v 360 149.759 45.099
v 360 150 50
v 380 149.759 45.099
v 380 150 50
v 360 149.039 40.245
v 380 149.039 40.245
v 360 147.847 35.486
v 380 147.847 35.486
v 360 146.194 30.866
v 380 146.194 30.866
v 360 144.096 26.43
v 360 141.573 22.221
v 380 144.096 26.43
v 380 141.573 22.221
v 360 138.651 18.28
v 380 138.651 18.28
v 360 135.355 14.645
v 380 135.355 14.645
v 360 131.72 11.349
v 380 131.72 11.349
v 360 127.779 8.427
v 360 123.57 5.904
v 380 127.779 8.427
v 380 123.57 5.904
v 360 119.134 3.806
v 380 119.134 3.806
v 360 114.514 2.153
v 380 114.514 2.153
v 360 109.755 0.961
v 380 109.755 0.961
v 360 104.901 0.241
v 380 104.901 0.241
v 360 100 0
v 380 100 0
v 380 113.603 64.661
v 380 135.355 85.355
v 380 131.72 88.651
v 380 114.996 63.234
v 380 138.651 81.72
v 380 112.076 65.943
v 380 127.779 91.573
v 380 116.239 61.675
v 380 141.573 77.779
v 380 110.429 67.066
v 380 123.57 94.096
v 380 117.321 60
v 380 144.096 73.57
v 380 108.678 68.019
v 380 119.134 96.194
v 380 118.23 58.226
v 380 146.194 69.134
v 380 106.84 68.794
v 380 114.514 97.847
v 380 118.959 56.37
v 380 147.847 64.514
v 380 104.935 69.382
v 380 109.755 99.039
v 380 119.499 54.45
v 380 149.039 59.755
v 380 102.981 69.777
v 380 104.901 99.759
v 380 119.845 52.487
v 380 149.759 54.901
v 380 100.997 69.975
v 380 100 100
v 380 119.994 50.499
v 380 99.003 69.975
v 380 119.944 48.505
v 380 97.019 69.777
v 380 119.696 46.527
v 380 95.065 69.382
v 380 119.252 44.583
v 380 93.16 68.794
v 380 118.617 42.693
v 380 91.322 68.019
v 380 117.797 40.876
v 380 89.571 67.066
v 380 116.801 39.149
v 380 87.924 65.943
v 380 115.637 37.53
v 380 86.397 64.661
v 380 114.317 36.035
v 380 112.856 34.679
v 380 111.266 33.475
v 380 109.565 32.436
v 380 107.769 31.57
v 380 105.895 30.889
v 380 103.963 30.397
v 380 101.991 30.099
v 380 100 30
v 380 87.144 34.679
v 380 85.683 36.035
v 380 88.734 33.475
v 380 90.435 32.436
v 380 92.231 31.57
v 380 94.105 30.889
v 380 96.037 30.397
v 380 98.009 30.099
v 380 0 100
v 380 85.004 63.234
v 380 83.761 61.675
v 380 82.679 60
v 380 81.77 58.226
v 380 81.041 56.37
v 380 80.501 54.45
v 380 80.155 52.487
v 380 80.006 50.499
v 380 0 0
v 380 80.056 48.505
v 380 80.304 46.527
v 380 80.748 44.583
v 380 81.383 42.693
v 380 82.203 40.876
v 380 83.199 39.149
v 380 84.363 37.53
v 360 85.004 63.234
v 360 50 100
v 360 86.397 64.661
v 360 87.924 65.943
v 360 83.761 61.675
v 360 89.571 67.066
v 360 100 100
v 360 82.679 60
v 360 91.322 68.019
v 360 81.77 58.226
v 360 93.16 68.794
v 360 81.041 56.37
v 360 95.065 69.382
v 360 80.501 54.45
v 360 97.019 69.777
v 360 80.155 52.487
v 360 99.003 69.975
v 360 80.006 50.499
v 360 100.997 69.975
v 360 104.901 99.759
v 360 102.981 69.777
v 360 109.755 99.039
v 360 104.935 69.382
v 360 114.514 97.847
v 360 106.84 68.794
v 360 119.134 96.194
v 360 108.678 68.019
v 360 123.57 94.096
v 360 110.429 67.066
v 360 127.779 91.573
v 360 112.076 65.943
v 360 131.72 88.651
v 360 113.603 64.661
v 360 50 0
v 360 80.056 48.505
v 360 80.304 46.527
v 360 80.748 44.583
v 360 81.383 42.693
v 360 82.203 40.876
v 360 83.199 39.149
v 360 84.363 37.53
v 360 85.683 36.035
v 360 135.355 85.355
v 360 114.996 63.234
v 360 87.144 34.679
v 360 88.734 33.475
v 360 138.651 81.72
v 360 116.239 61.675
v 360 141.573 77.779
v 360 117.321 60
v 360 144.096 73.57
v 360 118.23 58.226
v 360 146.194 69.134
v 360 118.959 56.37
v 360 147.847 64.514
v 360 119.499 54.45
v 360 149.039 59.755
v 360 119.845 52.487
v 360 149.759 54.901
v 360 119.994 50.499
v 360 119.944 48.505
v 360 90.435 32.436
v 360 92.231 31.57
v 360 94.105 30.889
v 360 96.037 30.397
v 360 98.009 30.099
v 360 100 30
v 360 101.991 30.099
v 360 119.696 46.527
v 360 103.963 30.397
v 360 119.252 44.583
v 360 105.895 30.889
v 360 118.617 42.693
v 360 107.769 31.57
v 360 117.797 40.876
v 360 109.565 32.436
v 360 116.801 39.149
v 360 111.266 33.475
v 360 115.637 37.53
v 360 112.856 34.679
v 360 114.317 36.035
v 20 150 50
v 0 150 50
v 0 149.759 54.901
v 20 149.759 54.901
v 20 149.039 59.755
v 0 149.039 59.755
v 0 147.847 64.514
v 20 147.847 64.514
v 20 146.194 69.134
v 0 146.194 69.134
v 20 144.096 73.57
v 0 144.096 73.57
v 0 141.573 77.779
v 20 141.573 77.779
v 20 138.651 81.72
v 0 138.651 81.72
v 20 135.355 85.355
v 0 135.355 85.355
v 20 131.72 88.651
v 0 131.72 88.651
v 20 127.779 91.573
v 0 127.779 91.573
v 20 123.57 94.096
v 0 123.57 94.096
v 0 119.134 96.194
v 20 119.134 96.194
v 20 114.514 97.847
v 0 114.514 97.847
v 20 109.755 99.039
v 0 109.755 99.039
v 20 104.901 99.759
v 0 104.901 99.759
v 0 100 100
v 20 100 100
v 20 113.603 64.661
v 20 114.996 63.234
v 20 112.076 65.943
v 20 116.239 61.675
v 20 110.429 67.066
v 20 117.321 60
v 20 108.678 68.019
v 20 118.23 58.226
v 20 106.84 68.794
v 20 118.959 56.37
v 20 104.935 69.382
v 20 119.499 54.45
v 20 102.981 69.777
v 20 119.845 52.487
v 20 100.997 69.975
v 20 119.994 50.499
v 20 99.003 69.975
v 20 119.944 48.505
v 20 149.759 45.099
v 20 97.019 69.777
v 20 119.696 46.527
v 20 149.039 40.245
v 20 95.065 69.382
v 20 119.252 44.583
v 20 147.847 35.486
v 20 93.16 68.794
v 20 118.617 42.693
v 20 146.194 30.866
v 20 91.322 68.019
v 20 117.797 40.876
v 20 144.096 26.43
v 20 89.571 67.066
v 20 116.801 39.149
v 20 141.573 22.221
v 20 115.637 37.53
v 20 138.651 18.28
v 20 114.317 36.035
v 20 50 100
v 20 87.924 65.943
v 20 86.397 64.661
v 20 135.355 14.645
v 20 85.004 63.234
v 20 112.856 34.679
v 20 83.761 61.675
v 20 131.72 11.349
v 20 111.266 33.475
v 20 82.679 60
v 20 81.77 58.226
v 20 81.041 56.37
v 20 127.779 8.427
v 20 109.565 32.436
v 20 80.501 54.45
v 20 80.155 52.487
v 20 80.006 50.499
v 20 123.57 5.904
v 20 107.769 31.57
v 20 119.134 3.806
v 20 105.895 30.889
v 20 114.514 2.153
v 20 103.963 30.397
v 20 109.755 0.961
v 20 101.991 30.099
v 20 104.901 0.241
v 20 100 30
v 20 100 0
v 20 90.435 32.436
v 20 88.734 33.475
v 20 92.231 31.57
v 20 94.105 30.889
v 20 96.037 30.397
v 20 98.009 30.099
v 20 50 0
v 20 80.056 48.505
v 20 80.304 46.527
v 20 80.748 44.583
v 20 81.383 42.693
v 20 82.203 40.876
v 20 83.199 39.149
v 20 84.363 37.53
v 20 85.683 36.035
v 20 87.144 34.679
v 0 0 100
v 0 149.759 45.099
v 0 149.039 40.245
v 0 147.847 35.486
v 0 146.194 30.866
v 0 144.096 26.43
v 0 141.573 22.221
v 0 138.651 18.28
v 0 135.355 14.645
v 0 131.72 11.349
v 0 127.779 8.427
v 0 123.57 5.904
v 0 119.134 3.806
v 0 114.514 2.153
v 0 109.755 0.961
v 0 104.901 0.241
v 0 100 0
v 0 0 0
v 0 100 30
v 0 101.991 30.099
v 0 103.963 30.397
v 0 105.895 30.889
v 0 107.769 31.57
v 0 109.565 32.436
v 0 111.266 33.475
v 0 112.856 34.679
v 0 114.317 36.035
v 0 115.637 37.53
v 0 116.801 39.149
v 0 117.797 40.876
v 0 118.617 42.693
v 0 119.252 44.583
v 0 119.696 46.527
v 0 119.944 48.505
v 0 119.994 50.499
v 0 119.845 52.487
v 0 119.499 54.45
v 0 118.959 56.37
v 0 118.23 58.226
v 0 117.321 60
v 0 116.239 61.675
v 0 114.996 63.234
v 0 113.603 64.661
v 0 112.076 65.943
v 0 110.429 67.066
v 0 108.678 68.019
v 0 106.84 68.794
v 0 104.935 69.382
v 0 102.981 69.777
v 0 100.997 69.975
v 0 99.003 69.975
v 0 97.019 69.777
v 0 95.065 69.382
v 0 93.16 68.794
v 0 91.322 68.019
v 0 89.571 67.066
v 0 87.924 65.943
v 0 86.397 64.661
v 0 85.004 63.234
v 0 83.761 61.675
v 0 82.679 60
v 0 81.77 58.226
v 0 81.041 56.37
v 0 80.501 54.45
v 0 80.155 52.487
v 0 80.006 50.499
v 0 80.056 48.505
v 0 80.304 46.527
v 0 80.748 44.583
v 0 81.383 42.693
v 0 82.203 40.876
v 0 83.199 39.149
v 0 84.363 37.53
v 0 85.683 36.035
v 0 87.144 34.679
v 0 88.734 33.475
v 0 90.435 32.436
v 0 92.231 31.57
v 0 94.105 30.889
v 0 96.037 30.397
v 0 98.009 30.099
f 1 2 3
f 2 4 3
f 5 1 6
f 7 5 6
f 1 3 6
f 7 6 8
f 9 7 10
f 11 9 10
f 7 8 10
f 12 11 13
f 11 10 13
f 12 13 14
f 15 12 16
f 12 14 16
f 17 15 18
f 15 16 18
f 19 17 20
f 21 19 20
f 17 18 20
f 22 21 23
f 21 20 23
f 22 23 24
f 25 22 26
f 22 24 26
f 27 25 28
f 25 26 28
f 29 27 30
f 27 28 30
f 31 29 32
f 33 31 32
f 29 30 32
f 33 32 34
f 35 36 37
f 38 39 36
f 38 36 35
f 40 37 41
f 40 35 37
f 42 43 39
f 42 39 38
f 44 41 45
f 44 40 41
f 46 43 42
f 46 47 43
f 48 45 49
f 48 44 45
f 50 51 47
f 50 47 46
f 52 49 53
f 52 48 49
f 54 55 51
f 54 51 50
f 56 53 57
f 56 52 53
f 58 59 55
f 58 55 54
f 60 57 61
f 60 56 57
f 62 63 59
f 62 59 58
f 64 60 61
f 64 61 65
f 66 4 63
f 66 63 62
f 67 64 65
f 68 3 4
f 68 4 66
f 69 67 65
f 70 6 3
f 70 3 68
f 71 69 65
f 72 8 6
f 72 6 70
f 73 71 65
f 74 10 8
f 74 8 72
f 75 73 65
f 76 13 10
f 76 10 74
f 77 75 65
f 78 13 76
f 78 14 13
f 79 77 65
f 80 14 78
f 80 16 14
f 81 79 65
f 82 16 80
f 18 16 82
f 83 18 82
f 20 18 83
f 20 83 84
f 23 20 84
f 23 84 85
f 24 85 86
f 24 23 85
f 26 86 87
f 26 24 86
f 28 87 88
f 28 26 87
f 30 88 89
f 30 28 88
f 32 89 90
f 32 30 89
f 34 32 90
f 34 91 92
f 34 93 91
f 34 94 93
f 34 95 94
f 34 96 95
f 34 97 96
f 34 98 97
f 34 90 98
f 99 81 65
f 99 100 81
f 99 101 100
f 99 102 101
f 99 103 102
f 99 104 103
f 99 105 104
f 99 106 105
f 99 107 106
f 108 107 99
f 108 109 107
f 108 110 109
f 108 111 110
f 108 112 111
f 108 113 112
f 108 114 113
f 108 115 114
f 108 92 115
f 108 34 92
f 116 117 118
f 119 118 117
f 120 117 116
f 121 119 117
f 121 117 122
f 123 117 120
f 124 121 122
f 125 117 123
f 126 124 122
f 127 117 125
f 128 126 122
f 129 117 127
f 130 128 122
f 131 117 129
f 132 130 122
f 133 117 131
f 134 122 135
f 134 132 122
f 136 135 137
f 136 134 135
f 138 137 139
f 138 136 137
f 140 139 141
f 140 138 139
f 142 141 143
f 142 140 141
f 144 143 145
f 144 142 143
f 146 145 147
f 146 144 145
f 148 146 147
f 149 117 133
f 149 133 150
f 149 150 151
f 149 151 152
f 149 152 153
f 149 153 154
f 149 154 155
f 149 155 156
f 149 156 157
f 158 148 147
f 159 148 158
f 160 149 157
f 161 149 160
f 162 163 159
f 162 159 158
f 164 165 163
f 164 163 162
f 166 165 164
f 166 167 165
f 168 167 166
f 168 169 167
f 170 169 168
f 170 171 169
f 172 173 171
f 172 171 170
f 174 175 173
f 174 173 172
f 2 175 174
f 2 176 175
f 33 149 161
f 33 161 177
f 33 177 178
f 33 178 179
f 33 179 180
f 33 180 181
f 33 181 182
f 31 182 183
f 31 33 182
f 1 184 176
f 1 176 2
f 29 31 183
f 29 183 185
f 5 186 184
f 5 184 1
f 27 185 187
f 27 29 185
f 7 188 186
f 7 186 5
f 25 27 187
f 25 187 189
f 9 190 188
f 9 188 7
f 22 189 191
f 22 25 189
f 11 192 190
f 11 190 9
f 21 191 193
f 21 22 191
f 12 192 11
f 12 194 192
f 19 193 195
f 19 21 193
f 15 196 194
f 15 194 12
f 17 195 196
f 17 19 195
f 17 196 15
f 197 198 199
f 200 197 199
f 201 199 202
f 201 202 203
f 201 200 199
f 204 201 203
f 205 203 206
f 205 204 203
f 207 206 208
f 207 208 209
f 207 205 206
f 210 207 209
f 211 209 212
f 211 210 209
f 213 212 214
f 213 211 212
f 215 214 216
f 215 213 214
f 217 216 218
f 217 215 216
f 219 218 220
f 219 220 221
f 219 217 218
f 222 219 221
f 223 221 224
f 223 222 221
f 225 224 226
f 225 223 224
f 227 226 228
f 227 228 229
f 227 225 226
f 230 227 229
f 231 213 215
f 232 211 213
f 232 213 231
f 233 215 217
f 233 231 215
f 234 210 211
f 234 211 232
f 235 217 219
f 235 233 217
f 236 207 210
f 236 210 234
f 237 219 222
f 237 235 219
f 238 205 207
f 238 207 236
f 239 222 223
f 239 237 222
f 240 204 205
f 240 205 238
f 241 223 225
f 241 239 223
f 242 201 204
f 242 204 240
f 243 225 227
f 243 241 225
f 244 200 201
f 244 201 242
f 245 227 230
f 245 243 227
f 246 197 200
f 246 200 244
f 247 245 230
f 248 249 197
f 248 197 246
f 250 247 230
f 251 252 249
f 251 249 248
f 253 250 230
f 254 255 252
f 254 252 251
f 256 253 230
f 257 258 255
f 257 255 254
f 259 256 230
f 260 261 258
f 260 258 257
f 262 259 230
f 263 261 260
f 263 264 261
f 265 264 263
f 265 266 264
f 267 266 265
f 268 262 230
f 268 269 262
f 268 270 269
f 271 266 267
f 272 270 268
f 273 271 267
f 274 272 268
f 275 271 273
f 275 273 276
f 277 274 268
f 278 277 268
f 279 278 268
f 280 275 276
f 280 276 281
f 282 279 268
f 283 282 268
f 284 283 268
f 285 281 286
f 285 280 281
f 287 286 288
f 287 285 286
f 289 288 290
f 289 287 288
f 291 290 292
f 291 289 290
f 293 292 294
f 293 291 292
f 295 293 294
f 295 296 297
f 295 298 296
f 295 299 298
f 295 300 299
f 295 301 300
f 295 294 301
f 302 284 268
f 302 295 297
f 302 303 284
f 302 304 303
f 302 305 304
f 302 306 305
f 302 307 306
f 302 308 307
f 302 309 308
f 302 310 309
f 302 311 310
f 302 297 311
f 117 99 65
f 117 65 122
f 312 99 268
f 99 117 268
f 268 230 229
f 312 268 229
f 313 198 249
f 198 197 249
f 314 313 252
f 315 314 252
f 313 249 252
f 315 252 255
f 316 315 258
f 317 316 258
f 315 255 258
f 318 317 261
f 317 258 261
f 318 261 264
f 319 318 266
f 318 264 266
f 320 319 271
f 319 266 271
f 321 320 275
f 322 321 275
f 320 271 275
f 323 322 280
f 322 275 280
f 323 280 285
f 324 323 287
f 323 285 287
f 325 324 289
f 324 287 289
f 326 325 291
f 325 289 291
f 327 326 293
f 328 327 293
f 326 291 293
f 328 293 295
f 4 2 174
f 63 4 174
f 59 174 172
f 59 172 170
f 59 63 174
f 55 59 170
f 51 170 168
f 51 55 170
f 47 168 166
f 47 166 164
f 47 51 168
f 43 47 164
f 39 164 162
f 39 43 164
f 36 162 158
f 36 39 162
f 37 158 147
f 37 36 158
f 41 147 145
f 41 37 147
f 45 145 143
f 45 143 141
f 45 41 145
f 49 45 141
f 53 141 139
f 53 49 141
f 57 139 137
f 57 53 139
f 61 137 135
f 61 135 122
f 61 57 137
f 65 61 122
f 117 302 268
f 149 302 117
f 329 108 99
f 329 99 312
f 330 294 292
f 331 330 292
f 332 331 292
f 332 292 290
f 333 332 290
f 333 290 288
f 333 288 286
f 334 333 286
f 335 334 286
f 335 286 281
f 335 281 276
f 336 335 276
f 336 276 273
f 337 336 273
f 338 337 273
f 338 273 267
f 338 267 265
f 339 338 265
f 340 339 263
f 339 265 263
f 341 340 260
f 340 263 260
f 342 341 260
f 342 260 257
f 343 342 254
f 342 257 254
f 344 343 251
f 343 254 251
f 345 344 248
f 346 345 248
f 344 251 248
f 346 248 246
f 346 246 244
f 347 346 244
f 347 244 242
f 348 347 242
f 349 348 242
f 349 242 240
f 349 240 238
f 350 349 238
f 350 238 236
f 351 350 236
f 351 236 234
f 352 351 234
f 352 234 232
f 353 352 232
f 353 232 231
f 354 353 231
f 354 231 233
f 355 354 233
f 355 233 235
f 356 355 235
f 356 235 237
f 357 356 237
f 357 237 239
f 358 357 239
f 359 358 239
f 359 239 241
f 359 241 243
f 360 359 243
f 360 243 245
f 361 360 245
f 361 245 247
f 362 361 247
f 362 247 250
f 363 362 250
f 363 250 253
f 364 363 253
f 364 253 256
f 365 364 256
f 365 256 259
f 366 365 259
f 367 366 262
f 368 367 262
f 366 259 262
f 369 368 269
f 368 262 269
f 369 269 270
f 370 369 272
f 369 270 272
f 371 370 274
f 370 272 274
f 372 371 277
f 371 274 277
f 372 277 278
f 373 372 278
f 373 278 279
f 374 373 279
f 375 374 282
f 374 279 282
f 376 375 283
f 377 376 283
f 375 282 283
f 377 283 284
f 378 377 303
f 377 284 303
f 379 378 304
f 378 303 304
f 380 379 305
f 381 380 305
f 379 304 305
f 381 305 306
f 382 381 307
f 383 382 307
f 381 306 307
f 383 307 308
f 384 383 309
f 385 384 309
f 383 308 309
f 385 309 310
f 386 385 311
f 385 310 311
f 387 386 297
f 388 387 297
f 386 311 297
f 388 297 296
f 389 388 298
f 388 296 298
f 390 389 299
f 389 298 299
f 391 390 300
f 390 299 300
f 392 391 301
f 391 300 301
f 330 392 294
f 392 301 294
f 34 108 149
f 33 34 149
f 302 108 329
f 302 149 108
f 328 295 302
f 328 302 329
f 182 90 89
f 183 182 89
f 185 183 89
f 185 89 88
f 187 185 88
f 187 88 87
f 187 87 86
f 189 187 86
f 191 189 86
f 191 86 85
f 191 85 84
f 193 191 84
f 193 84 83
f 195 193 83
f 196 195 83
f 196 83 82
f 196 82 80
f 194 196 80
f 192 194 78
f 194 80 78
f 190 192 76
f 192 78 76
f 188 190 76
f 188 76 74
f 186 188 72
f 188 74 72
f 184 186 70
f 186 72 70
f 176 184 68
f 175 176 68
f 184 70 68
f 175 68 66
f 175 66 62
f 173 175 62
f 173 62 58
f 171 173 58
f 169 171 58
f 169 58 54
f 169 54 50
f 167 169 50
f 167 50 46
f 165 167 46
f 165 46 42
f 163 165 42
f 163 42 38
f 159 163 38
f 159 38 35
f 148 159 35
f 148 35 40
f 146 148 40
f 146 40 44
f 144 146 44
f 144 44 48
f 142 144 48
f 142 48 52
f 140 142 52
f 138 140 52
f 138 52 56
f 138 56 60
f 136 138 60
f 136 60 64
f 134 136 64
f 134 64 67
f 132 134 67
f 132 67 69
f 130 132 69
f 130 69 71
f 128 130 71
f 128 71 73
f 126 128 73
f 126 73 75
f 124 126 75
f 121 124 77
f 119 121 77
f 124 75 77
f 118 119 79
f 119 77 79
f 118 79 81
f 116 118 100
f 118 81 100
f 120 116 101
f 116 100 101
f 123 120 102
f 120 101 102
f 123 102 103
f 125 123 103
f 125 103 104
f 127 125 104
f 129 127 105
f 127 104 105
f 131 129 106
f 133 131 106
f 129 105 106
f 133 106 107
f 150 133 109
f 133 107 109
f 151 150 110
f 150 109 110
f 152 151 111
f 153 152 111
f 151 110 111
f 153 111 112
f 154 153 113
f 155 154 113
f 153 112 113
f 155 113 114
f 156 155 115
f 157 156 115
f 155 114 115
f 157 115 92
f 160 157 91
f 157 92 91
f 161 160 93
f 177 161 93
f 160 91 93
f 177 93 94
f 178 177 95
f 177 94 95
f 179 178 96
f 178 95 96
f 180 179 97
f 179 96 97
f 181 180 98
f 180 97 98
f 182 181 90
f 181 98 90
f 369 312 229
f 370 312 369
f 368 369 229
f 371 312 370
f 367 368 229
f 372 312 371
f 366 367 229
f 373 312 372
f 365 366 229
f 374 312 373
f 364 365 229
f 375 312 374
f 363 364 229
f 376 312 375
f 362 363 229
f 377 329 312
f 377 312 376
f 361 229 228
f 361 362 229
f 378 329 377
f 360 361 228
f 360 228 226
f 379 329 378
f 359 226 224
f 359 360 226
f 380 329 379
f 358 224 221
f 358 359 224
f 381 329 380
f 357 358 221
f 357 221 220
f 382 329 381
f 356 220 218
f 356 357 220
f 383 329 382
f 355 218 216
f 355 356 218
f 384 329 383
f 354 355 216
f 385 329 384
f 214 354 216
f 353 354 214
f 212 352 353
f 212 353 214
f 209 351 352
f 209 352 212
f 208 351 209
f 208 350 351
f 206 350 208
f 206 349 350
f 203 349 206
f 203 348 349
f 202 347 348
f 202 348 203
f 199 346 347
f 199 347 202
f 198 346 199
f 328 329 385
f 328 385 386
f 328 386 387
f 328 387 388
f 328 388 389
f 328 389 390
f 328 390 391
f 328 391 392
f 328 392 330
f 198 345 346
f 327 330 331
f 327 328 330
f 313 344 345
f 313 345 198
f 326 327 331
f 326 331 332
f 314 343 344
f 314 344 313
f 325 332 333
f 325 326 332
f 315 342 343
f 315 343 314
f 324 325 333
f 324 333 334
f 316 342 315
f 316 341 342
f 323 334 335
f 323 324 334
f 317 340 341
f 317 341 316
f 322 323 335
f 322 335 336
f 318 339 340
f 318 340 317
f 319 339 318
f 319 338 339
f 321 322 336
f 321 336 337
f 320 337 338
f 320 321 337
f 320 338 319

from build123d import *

# Parameters (mm, degrees)
BOSS_EXTRUDE1_DEPTH = 100
FILLET4_R           = 50
SKETCH5_R           = 20
CUT_EXTRUDE1_DEPTH  = 421.594816896


with BuildPart() as part:
    # Sketch2 → Boss-Extrude1 (new body)
    with BuildSketch(Plane.XY):
        Polygon((0, 0), (0, 150), (20, 150), (20, 50), (360, 50), (360, 150), (380, 150), (380, 0), align=None)
    extrude(amount=BOSS_EXTRUDE1_DEPTH)

    # Fillet4
    fillet4_edges = [part.edges().sort_by_distance(p)[0] for p in [
        (10, 150, 0),
        (10, 150, 100),
        (370, 150, 100),
        (370, 150, 0),
    ]]
    fillet(fillet4_edges, radius=FILLET4_R - 0.0001)  # a hair under: the kernel refuses the full size

    # Sketch5 → Cut-Extrude1 (cut, through all)
    with BuildSketch(Plane(origin=(380, 0, 0), x_dir=(0, 0, -1), z_dir=(1, 0, 0))):
        with Locations((-50, 100)):
            Circle(SKETCH5_R)
    extrude(amount=-CUT_EXTRUDE1_DEPTH, mode=Mode.SUBTRACT)


solid = part.part
